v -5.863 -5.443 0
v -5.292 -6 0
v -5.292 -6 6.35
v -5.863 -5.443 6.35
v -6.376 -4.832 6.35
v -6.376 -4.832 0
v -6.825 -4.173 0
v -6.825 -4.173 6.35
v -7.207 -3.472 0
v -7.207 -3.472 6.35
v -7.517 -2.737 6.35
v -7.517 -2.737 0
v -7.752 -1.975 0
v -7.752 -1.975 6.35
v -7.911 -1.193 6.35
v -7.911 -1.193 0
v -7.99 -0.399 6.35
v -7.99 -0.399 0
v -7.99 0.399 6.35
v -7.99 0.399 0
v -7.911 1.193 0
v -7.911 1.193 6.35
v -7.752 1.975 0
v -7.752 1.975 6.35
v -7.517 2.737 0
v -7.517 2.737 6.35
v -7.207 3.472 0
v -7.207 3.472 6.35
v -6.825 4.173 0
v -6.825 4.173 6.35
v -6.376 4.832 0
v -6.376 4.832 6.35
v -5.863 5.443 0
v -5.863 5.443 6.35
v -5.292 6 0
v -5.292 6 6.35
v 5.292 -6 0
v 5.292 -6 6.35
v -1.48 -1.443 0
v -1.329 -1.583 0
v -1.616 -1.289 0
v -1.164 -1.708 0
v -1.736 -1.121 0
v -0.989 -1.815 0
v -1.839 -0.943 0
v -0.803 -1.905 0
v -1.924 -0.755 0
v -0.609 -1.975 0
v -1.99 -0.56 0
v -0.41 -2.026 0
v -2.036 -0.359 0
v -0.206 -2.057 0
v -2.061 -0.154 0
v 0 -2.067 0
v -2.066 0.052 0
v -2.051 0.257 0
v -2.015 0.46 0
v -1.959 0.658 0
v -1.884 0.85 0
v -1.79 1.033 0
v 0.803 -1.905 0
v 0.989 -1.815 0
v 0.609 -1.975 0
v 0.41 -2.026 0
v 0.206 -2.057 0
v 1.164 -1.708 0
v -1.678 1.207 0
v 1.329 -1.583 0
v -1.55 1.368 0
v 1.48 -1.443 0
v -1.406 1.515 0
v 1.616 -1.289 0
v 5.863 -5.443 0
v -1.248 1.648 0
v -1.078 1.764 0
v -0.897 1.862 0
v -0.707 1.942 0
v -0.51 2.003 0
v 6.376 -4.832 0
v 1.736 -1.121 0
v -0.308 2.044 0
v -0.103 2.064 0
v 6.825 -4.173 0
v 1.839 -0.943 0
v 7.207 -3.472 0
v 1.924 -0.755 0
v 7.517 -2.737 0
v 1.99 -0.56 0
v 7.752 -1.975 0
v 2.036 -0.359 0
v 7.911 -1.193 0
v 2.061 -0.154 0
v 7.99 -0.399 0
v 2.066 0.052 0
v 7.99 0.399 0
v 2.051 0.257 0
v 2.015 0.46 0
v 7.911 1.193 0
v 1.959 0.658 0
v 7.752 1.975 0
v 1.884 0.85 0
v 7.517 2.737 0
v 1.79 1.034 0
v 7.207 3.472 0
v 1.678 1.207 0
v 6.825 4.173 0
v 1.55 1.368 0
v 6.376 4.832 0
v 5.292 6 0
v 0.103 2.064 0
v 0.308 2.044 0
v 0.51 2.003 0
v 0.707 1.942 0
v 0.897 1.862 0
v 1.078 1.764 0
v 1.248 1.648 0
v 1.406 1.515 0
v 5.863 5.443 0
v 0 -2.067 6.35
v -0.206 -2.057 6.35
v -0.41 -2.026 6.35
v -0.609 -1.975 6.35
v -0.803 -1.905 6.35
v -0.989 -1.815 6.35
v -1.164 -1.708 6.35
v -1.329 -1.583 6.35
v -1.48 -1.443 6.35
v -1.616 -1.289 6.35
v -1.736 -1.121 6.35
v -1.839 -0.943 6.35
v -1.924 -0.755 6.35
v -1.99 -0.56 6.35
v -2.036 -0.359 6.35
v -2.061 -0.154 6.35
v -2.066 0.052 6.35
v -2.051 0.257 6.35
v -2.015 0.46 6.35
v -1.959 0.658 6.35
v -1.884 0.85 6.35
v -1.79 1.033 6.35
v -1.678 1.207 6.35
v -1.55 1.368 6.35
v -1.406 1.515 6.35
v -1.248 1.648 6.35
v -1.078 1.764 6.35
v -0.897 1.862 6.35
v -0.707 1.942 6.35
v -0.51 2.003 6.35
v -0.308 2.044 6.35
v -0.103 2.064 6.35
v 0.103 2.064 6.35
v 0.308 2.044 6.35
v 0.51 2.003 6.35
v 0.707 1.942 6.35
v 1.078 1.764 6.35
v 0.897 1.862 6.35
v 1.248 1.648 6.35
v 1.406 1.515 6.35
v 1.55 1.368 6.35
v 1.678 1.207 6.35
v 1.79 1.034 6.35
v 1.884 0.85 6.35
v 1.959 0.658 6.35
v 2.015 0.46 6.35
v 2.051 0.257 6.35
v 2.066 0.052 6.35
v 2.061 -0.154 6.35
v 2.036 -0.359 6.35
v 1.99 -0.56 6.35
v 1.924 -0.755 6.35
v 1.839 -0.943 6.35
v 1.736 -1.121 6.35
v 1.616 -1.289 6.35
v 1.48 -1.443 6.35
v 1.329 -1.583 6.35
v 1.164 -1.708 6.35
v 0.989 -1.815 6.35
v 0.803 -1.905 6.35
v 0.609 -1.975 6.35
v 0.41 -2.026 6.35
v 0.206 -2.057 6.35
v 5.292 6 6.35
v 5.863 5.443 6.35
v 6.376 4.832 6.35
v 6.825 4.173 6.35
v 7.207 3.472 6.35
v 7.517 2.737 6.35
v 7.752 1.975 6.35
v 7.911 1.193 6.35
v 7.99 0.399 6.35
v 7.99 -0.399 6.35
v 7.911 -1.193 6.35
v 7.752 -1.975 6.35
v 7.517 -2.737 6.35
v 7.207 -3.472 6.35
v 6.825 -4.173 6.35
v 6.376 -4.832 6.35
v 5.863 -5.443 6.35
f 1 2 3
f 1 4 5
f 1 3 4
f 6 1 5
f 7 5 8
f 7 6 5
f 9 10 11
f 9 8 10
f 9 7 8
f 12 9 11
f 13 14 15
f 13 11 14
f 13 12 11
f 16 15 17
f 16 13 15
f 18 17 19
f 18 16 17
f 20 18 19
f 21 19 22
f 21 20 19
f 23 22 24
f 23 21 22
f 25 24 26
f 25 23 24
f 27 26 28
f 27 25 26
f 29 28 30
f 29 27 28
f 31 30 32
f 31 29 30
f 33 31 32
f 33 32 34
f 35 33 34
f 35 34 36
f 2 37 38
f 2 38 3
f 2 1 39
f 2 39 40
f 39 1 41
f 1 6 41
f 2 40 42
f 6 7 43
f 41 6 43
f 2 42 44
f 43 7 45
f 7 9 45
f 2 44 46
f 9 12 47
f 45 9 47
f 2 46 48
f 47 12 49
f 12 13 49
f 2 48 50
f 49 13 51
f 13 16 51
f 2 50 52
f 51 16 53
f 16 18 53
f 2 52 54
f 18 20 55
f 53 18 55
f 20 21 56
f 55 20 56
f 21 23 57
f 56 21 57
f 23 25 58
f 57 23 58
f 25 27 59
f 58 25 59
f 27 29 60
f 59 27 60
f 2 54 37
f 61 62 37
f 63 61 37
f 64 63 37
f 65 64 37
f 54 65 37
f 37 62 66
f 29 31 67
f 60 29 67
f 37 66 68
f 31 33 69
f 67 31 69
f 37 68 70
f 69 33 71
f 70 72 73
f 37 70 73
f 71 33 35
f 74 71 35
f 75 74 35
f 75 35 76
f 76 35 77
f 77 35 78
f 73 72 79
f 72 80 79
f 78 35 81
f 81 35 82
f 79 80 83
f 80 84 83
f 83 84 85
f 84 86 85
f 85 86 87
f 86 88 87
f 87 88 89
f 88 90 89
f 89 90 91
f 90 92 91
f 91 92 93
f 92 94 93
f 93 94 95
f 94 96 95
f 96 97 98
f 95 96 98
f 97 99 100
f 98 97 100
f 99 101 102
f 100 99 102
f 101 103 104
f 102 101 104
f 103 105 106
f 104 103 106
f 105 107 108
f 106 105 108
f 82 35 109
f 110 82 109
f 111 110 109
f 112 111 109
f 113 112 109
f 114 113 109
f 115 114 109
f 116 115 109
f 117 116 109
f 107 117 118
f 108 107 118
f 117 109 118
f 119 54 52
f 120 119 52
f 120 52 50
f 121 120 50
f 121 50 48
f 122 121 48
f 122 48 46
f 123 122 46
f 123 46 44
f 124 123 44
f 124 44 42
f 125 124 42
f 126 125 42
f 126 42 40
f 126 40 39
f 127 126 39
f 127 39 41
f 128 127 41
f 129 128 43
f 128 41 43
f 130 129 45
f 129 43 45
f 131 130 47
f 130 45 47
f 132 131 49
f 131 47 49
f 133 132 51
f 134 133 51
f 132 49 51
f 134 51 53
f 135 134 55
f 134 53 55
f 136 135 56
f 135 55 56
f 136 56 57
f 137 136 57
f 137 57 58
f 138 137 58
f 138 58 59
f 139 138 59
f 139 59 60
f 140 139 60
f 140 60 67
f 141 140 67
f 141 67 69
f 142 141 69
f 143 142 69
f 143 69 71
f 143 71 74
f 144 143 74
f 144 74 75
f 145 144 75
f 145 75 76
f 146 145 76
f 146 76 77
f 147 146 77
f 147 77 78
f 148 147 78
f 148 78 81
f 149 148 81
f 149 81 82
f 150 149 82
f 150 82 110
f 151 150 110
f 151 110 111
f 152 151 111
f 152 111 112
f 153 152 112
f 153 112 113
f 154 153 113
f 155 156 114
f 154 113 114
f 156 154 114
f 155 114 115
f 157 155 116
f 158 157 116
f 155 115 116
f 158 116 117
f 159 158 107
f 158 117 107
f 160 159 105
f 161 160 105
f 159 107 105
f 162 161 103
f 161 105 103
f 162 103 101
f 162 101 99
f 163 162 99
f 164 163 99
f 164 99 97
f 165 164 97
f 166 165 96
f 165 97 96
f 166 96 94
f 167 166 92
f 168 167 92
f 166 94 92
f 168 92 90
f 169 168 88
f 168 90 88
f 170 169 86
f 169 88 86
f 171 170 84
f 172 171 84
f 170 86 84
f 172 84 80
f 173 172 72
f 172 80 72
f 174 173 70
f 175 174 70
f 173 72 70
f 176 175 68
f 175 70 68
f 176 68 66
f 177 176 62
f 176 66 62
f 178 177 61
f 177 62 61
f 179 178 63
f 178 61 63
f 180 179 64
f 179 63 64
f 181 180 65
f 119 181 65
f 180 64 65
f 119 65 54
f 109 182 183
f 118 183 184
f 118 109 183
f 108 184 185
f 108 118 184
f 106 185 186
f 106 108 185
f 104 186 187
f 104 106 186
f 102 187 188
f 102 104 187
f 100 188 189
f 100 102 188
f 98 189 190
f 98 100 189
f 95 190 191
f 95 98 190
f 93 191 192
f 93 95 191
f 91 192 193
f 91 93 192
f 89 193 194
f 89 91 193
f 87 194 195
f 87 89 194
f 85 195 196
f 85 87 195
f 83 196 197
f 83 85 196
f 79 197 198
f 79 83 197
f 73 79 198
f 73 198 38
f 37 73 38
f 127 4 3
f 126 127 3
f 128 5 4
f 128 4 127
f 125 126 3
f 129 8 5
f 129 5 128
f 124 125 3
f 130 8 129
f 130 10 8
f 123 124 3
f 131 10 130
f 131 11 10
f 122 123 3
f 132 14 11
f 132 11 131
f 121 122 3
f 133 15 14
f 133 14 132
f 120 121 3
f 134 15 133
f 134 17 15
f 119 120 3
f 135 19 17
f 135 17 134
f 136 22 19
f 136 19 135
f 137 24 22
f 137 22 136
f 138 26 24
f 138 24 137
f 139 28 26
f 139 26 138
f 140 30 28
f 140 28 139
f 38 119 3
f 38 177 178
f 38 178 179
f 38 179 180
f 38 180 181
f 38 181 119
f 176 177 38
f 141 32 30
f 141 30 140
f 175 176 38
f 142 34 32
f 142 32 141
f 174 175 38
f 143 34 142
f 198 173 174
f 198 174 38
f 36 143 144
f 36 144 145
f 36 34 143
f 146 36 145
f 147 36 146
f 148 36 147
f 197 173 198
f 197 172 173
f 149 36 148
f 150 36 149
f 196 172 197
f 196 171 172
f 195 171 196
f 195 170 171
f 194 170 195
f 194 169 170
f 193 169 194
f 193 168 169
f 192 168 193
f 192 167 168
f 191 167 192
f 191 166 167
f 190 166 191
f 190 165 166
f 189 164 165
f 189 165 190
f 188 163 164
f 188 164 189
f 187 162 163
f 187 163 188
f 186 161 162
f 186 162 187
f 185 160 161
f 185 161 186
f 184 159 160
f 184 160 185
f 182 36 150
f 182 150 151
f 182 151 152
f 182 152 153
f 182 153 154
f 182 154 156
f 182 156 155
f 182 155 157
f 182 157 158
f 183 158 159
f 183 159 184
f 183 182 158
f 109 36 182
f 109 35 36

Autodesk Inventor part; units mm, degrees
ref_plane "YZ Plane" through (0, 0, 0) normal (1, 0, 0) x (0, 1, 0)
ref_plane "XZ Plane" through (0, 0, 0) normal (0, 1, 0) x (-1, 0, 0)
ref_plane "XY Plane" through (0, 0, 0) normal (0, 0, 1) x (1, 0, 0)
sketch "Sketch1" plane through (0, 0, 0) normal (0, 0, 1) x (1, 0, 0)
  circle A0 centre (0, 0) radius 8
  line L0 (5.2915, -6) -> (-5.2915, -6)
  line L1 (-5.2915, -6) -> (-5.2915, 6)
  line L2 (-5.2915, 6) -> (5.2915, 6)
  line L3 (5.2915, 6) -> (5.2915, -6)
  line L4 (5.2915, -6) -> (-5.2915, 6) construction
  line L5 (-5.2915, -6) -> (5.2915, 6) construction
  point P0 (-5.2915, -6)
  point P1 (5.2915, -6)
  point P2 (5.2915, 6)
  dimension "d0" = 16
  dimension "d1" = 12
extrude "Extrusion1" add sketch "Sketch1" along normal blind 6.35 contours A0 L3 | L3 L0 L1 L2 | L1 A0
sketch "Sketch2" plane through (0, 0, 6.35) normal (0, 0, 1) x (1, 0, 0)
  arc A0 (-5.2915, 6) -> (-5.2915, -6) centre (0, 0) ccw projected
hole "Hole1" at (0, 0, 6.35) direction (0, 0, -1) diameter 4.134 end through all thread size "M5x0.8" class "6H" standard "ANSI Metric M Profile"
properties part number "Print Bed Washers" material "Aluminum 6061"
